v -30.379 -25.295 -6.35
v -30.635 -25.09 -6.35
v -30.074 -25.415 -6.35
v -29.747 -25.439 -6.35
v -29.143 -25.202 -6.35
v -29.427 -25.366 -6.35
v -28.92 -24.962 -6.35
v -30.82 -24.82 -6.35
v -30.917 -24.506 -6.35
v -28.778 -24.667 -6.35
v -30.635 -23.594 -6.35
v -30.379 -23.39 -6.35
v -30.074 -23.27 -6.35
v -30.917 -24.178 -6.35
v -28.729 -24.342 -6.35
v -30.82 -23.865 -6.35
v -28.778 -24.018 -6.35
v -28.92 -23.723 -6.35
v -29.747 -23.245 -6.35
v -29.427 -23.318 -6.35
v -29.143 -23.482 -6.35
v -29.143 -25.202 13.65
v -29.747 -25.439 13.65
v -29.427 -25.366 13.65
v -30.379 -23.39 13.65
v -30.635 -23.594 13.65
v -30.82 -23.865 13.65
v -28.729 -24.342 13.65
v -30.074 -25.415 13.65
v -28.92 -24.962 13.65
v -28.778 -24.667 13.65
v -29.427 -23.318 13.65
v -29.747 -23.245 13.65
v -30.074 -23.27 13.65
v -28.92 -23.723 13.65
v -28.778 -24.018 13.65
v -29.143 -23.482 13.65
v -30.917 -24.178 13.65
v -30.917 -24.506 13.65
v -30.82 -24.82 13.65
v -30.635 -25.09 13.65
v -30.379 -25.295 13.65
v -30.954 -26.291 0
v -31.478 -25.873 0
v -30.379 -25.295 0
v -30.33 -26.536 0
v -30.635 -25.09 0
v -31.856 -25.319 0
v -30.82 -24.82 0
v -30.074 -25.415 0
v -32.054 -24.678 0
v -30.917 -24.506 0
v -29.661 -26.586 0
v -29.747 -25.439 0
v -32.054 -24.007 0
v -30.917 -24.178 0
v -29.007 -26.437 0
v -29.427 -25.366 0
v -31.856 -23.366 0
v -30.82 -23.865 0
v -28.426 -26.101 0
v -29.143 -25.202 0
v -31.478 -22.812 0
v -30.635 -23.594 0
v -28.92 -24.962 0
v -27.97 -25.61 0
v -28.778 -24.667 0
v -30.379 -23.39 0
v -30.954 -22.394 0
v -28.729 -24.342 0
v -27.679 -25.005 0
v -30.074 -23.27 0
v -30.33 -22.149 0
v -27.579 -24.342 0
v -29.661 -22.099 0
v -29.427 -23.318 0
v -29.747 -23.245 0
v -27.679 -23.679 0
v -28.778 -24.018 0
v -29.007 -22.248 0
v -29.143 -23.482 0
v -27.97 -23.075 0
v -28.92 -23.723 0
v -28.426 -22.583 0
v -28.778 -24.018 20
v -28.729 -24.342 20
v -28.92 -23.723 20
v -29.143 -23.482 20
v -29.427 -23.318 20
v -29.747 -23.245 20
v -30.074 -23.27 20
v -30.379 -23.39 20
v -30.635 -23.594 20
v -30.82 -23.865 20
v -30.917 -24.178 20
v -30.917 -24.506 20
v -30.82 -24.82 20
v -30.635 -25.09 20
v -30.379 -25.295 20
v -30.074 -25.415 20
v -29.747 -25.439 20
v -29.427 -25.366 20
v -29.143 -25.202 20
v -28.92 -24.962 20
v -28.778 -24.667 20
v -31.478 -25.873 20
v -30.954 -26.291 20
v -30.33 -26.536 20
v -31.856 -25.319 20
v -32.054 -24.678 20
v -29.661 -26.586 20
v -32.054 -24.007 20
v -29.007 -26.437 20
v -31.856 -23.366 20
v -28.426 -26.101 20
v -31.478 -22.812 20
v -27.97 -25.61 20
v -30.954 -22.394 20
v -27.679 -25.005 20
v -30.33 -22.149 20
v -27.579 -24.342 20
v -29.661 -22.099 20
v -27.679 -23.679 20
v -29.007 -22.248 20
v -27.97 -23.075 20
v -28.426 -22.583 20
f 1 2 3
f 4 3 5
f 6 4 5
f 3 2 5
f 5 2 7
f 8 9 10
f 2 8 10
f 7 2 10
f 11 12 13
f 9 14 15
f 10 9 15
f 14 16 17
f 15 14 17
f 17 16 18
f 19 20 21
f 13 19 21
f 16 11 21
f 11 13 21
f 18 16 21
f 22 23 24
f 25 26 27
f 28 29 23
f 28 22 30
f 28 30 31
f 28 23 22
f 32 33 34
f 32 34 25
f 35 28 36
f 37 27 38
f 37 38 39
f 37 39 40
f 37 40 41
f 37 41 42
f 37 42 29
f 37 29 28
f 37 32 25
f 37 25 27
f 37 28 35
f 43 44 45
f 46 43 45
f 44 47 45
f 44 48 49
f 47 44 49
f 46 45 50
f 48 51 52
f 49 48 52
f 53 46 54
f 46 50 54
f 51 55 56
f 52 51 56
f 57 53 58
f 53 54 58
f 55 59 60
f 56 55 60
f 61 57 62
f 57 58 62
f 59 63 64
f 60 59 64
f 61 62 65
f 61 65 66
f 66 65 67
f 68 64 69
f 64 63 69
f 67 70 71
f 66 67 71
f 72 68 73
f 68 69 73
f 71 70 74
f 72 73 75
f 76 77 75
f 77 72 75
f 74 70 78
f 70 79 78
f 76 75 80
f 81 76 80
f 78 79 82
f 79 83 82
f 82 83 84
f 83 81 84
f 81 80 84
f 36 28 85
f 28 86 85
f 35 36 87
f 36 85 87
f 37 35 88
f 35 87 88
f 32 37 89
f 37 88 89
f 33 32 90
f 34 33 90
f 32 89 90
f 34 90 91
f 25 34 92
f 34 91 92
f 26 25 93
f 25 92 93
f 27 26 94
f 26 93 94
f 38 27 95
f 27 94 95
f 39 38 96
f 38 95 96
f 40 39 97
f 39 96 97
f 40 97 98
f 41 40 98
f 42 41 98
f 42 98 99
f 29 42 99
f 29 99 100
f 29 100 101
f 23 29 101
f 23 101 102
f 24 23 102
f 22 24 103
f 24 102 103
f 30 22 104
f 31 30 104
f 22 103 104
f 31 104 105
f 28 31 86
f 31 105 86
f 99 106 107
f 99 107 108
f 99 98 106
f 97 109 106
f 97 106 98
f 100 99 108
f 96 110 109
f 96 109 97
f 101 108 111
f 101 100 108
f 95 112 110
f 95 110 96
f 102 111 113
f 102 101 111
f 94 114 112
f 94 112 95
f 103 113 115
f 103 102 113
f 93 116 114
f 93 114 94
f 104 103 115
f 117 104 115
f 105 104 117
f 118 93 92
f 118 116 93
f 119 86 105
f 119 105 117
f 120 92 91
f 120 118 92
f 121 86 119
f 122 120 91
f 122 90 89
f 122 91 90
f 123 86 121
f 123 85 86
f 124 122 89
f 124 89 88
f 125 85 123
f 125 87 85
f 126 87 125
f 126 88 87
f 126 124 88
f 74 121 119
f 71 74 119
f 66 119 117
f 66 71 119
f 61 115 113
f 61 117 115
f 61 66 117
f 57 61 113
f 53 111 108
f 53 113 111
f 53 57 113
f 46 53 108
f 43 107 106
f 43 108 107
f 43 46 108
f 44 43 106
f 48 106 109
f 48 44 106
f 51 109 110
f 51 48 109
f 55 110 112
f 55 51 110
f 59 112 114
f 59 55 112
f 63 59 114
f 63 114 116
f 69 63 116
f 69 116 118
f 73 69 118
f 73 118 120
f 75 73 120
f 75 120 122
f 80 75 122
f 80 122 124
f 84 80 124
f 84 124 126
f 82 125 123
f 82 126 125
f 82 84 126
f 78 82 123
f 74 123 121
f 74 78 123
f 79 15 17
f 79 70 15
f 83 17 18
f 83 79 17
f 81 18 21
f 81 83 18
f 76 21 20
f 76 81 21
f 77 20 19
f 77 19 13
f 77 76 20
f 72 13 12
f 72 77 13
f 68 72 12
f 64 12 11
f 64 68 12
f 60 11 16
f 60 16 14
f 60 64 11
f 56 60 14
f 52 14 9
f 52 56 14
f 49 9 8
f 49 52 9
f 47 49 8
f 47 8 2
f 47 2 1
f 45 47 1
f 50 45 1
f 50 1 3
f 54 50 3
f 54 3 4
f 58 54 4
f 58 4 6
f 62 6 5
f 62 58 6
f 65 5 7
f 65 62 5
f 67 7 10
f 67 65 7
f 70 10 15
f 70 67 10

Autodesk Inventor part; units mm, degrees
ref_plane "YZ Plane" through (0, 0, 0) normal (1, 0, 0) x (0, 1, 0)
ref_plane "XZ Plane" through (0, 0, 0) normal (0, 1, 0) x (-1, 0, 0)
ref_plane "XY Plane" through (0, 0, 0) normal (0, 0, 1) x (1, 0, 0)
ref_plane "Work Plane1" through (0, 0, 0) normal (0, 0, 1) x (1, 0, 0)
sketch "Sketch1" plane through (0, 0, 0) normal (0, 0, 1) x (1, 0, 0)
  circle A0 centre (-29.8289, -24.3423) radius 1.1 projected
  point P0 (0, 0)
extrude "Extrusion1" add sketch "Sketch1" against normal blind 6.35
ref_plane "Work Plane2" through (0, 0, 0) normal (0, 0, 1) x (1, 0, 0)
sketch "Sketch2" plane through (0, 0, 0) normal (0, 0, 1) x (1, 0, 0)
  circle A0 centre (-29.8289, -24.3423) radius 1.1 projected
  circle A1 centre (-29.8289, -24.3423) radius 2.25
  point P0 (0, 0)
  dimension "d5" = 4.5
extrude "Extrusion3" add sketch "Sketch2" along normal blind 20 contours A0 | A1
sketch "Sketch3" plane through (-29.8289, -24.3423, 20) normal (0, 0, 1) x (1, 0, 0)
  circle A0 centre (0, 0) radius 1.1
  point P0 (29.8289, 24.3423)
extrude "Extrusion4" cut sketch "Sketch3" against normal blind 6.35
properties part number "standoff" material "Stainless Steel"
